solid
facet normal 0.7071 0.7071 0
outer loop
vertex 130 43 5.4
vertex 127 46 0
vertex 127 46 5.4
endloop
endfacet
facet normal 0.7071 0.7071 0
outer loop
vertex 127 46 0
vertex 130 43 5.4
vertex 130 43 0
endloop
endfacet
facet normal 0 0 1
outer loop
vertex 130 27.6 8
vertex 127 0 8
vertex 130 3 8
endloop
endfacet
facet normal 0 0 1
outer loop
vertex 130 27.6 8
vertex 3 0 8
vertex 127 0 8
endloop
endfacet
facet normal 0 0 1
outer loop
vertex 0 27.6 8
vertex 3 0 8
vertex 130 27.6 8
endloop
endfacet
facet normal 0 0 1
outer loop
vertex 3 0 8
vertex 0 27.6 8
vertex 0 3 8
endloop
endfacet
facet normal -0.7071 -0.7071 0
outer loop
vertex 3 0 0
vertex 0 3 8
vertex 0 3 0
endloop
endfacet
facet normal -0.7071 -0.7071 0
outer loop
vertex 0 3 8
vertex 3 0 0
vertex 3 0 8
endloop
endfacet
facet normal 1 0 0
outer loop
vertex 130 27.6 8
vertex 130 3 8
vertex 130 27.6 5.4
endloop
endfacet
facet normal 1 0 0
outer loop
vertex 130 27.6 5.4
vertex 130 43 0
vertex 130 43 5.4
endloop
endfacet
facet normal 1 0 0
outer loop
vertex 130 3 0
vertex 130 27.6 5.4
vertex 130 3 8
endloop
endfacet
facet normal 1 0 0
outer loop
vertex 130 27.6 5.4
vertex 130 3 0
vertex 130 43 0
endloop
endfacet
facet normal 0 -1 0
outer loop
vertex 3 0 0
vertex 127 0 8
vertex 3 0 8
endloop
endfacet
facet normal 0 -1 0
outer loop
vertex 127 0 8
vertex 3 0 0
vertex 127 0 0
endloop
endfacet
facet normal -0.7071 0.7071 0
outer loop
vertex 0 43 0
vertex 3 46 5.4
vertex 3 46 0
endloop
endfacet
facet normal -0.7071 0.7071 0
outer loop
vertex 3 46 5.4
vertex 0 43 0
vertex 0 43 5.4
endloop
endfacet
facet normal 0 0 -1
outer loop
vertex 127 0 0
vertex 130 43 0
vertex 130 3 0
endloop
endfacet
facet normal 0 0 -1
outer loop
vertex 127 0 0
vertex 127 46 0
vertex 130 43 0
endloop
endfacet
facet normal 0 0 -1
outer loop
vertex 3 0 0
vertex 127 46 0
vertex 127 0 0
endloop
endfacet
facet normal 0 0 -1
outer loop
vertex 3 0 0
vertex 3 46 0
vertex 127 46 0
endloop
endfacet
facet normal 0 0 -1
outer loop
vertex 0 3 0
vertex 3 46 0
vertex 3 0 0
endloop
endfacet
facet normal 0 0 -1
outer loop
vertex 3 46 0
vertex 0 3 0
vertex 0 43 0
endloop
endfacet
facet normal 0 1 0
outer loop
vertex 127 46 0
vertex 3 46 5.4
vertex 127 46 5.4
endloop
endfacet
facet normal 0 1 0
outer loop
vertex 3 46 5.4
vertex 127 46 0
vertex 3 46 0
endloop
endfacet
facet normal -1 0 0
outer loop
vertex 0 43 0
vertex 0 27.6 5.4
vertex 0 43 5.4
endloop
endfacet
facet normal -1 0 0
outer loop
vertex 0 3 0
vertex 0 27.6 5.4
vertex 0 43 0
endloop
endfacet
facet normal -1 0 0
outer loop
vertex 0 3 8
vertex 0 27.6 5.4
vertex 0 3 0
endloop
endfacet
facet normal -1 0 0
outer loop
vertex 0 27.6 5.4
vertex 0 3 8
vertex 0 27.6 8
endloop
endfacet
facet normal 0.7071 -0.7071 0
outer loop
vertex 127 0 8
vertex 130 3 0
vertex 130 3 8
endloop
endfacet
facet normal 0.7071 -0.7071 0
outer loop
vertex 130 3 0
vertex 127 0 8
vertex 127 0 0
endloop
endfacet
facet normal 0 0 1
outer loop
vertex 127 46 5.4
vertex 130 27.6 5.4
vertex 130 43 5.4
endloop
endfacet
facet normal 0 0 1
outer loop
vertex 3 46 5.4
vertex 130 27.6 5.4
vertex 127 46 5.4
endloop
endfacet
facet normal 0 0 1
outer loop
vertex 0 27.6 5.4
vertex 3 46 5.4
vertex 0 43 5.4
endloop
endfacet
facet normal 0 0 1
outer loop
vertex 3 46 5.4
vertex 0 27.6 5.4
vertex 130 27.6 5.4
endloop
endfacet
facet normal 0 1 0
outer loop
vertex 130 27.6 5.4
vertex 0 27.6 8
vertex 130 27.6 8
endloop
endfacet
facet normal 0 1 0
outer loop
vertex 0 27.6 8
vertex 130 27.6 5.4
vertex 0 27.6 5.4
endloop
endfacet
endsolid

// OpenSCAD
$fn = 32;

// ----------------------------------------------------------------------
// Stepped bar: sidestep, 130 x 46 x 8/5.4 mm
// ----------------------------------------------------------------------

// --- parameters (mm) ---
bar_l = 130;              // bar length, X
bar_w = 46;               // bar width, Y
plate_t = 8;              // thickness of the thick zone, Z
thin_t = 5.4;             // thickness of the thin zone
corner_c = 3;             // corner chamfer of the bar
step_cut = 2.6;           // material removed from the thin zone
ledge_y = 27.6;           // start of the ledge from the front edge
depth_1 = 2.6;            // depth of cut 1 from the top face

profile = [[3, 0], [127, 0], [130, 3], [130, 43], [127, 46], [3, 46], [0, 43], [0, 3]];  // primary outline, 8 points, counter clockwise
void_1 = [[-1, 27.6], [131, 27.6], [131, 47], [-1, 47]];  // ledge cut along one edge, 4 points

// --- the one profile operation ---
difference() {
  linear_extrude(height = plate_t) polygon(points = profile);
  translate([0, 0, plate_t - depth_1])
    linear_extrude(height = depth_1 + 1) polygon(points = void_1);
}
